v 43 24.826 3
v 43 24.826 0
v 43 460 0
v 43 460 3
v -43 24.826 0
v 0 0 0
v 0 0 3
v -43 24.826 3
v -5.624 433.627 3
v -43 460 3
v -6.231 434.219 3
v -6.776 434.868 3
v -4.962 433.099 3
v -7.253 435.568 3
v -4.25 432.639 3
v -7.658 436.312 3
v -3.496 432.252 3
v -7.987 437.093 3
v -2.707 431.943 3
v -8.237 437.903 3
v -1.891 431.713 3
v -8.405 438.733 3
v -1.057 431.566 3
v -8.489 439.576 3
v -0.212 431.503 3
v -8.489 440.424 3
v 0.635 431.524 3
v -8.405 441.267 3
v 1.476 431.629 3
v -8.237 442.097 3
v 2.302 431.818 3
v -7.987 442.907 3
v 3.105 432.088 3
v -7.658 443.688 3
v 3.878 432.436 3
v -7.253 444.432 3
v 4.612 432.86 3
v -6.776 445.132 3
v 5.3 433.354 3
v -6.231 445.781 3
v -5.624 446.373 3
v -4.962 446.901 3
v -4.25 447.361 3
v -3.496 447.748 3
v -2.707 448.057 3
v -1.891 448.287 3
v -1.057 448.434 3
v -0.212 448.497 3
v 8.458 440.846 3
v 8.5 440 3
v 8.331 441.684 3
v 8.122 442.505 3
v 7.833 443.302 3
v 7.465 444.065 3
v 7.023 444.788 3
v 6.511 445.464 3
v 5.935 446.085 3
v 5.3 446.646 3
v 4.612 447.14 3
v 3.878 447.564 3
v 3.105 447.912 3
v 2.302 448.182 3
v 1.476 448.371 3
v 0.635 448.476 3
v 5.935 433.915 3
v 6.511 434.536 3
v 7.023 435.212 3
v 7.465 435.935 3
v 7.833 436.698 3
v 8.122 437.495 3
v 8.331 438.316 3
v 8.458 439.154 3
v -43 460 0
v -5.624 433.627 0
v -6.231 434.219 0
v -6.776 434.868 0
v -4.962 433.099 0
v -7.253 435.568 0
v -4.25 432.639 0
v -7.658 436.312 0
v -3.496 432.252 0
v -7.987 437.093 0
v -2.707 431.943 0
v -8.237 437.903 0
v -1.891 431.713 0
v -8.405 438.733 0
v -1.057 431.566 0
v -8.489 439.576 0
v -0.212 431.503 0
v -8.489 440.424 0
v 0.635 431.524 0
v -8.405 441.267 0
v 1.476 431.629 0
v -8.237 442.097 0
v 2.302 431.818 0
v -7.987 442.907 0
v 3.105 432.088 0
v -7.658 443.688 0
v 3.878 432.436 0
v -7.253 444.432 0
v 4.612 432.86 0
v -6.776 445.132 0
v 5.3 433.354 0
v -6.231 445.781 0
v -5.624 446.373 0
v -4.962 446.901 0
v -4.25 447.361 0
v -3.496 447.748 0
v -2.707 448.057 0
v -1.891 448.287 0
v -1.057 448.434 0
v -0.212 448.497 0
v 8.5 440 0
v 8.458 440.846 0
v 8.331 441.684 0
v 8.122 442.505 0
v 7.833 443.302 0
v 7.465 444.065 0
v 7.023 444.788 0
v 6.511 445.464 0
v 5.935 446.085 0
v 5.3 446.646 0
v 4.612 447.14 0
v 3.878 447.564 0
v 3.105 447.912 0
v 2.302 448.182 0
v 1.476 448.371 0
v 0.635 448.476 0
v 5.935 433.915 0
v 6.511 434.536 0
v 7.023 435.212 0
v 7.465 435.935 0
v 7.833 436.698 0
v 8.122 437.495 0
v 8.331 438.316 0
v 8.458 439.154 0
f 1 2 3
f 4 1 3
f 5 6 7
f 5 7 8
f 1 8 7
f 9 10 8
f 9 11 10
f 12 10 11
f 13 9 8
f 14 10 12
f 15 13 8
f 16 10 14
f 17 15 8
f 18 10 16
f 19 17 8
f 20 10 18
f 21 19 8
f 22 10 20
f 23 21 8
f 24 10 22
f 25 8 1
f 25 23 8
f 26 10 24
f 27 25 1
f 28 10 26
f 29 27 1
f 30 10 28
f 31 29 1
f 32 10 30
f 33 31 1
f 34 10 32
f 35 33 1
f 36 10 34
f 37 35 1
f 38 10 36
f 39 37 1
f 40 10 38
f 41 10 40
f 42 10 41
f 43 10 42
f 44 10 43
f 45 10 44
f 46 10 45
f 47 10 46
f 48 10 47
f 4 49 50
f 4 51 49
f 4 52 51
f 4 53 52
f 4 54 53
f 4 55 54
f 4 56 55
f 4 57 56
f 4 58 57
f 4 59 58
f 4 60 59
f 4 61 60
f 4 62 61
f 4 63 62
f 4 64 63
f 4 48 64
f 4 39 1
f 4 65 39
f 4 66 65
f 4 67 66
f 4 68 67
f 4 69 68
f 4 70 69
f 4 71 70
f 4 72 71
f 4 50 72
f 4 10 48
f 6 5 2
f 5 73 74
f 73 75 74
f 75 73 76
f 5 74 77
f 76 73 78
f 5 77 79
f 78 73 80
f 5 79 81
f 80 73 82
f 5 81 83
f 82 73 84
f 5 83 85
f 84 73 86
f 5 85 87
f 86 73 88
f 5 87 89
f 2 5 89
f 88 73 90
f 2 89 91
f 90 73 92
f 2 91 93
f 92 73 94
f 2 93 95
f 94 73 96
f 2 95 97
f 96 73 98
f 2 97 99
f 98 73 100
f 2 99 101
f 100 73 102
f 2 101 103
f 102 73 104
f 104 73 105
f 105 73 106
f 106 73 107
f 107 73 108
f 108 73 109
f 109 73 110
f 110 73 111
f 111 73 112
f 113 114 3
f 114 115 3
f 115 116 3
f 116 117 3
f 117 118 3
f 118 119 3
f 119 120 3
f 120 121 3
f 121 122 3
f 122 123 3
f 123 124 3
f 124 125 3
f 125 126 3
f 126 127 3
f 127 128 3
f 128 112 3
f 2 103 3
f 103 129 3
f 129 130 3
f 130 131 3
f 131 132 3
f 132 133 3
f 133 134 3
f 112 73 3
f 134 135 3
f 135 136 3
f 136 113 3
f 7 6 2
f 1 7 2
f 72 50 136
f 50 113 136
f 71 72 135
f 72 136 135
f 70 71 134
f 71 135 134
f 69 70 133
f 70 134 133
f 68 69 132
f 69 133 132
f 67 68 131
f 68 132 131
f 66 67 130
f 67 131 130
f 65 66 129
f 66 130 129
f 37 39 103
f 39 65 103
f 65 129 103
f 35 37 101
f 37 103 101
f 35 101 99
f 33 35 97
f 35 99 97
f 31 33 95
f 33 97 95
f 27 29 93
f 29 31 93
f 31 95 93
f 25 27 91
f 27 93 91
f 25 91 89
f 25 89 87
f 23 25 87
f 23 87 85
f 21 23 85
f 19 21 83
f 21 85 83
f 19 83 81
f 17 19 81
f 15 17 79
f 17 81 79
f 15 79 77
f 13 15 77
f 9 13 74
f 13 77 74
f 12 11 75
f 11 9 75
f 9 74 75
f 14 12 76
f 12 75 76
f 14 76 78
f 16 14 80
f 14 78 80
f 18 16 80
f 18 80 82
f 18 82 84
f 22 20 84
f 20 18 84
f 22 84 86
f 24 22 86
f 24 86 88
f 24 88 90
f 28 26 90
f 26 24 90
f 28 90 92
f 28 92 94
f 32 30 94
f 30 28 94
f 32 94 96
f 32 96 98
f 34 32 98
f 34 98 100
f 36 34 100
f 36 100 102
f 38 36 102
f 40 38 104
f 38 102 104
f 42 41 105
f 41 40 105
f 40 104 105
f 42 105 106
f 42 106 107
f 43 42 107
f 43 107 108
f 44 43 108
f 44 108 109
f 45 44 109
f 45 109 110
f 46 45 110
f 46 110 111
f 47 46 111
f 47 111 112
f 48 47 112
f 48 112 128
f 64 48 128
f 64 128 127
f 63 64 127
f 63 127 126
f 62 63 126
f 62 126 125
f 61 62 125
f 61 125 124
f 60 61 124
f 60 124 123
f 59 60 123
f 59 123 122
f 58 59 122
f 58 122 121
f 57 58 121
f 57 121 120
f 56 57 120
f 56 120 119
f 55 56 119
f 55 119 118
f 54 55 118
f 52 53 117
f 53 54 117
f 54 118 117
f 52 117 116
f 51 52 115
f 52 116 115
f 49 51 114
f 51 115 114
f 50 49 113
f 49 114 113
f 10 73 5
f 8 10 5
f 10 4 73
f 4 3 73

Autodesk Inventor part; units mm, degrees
ref_plane "YZ Plane" through (0, 0, 0) normal (1, 0, 0) x (0, 1, 0)
ref_plane "XZ Plane" through (0, 0, 0) normal (0, 1, 0) x (-1, 0, 0)
ref_plane "XY Plane" through (0, 0, 0) normal (0, 0, 1) x (1, 0, 0)
sketch "Sketch6" plane through (0, 0, 0) normal (0, 0, 1) x (1, 0, 0)
  line L0 (0, 0) -> (43, 24.8261)
  line L1 (0, 0) -> (-43, 24.8261)
  line L2 (0, 0) -> (0, 440) construction
  line L3 (-43, 24.8261) -> (43, 24.8261) construction
  line L4 (43, 24.8261) -> (43, 460)
  line L5 (43, 460) -> (-43, 460)
  line L6 (-43, 460) -> (-43, 24.8261)
  circle A0 centre (0, 440) radius 8.5
  circle A1 centre (0, 0) radius 440 construction
  circle A2 centre (0, 0) radius 460 construction
  dimension "d44" = 880
  dimension "d40" = 120
  dimension "d42" = 86
  dimension "d43" = 17
  dimension "d45" = 920
extrude "Plate3" add sketch "Sketch6" along normal blind 3
equation "\"d46\" = Thickness"
equation "\"BendReliefWidth\" = Thickness"
equation "\"BendReliefDepth\" = 0.5 * Thickness"
equation "\"CornerReliefSize\" = 4 * Thickness"
equation "\"MinimumRemnant\" = 2 * Thickness"
equation "\"TransitionRadius\" = BendRadius"
equation "\"JacobiRadiusSize\" = BendRadius"
equation "\"GapSize\" = Thickness"
equation "\"Thickness\" = 3"
equation "\"BendRadius\" = 5"
properties part number "PRS 940-96 leg floor pattern" material "Stainless Steel"
